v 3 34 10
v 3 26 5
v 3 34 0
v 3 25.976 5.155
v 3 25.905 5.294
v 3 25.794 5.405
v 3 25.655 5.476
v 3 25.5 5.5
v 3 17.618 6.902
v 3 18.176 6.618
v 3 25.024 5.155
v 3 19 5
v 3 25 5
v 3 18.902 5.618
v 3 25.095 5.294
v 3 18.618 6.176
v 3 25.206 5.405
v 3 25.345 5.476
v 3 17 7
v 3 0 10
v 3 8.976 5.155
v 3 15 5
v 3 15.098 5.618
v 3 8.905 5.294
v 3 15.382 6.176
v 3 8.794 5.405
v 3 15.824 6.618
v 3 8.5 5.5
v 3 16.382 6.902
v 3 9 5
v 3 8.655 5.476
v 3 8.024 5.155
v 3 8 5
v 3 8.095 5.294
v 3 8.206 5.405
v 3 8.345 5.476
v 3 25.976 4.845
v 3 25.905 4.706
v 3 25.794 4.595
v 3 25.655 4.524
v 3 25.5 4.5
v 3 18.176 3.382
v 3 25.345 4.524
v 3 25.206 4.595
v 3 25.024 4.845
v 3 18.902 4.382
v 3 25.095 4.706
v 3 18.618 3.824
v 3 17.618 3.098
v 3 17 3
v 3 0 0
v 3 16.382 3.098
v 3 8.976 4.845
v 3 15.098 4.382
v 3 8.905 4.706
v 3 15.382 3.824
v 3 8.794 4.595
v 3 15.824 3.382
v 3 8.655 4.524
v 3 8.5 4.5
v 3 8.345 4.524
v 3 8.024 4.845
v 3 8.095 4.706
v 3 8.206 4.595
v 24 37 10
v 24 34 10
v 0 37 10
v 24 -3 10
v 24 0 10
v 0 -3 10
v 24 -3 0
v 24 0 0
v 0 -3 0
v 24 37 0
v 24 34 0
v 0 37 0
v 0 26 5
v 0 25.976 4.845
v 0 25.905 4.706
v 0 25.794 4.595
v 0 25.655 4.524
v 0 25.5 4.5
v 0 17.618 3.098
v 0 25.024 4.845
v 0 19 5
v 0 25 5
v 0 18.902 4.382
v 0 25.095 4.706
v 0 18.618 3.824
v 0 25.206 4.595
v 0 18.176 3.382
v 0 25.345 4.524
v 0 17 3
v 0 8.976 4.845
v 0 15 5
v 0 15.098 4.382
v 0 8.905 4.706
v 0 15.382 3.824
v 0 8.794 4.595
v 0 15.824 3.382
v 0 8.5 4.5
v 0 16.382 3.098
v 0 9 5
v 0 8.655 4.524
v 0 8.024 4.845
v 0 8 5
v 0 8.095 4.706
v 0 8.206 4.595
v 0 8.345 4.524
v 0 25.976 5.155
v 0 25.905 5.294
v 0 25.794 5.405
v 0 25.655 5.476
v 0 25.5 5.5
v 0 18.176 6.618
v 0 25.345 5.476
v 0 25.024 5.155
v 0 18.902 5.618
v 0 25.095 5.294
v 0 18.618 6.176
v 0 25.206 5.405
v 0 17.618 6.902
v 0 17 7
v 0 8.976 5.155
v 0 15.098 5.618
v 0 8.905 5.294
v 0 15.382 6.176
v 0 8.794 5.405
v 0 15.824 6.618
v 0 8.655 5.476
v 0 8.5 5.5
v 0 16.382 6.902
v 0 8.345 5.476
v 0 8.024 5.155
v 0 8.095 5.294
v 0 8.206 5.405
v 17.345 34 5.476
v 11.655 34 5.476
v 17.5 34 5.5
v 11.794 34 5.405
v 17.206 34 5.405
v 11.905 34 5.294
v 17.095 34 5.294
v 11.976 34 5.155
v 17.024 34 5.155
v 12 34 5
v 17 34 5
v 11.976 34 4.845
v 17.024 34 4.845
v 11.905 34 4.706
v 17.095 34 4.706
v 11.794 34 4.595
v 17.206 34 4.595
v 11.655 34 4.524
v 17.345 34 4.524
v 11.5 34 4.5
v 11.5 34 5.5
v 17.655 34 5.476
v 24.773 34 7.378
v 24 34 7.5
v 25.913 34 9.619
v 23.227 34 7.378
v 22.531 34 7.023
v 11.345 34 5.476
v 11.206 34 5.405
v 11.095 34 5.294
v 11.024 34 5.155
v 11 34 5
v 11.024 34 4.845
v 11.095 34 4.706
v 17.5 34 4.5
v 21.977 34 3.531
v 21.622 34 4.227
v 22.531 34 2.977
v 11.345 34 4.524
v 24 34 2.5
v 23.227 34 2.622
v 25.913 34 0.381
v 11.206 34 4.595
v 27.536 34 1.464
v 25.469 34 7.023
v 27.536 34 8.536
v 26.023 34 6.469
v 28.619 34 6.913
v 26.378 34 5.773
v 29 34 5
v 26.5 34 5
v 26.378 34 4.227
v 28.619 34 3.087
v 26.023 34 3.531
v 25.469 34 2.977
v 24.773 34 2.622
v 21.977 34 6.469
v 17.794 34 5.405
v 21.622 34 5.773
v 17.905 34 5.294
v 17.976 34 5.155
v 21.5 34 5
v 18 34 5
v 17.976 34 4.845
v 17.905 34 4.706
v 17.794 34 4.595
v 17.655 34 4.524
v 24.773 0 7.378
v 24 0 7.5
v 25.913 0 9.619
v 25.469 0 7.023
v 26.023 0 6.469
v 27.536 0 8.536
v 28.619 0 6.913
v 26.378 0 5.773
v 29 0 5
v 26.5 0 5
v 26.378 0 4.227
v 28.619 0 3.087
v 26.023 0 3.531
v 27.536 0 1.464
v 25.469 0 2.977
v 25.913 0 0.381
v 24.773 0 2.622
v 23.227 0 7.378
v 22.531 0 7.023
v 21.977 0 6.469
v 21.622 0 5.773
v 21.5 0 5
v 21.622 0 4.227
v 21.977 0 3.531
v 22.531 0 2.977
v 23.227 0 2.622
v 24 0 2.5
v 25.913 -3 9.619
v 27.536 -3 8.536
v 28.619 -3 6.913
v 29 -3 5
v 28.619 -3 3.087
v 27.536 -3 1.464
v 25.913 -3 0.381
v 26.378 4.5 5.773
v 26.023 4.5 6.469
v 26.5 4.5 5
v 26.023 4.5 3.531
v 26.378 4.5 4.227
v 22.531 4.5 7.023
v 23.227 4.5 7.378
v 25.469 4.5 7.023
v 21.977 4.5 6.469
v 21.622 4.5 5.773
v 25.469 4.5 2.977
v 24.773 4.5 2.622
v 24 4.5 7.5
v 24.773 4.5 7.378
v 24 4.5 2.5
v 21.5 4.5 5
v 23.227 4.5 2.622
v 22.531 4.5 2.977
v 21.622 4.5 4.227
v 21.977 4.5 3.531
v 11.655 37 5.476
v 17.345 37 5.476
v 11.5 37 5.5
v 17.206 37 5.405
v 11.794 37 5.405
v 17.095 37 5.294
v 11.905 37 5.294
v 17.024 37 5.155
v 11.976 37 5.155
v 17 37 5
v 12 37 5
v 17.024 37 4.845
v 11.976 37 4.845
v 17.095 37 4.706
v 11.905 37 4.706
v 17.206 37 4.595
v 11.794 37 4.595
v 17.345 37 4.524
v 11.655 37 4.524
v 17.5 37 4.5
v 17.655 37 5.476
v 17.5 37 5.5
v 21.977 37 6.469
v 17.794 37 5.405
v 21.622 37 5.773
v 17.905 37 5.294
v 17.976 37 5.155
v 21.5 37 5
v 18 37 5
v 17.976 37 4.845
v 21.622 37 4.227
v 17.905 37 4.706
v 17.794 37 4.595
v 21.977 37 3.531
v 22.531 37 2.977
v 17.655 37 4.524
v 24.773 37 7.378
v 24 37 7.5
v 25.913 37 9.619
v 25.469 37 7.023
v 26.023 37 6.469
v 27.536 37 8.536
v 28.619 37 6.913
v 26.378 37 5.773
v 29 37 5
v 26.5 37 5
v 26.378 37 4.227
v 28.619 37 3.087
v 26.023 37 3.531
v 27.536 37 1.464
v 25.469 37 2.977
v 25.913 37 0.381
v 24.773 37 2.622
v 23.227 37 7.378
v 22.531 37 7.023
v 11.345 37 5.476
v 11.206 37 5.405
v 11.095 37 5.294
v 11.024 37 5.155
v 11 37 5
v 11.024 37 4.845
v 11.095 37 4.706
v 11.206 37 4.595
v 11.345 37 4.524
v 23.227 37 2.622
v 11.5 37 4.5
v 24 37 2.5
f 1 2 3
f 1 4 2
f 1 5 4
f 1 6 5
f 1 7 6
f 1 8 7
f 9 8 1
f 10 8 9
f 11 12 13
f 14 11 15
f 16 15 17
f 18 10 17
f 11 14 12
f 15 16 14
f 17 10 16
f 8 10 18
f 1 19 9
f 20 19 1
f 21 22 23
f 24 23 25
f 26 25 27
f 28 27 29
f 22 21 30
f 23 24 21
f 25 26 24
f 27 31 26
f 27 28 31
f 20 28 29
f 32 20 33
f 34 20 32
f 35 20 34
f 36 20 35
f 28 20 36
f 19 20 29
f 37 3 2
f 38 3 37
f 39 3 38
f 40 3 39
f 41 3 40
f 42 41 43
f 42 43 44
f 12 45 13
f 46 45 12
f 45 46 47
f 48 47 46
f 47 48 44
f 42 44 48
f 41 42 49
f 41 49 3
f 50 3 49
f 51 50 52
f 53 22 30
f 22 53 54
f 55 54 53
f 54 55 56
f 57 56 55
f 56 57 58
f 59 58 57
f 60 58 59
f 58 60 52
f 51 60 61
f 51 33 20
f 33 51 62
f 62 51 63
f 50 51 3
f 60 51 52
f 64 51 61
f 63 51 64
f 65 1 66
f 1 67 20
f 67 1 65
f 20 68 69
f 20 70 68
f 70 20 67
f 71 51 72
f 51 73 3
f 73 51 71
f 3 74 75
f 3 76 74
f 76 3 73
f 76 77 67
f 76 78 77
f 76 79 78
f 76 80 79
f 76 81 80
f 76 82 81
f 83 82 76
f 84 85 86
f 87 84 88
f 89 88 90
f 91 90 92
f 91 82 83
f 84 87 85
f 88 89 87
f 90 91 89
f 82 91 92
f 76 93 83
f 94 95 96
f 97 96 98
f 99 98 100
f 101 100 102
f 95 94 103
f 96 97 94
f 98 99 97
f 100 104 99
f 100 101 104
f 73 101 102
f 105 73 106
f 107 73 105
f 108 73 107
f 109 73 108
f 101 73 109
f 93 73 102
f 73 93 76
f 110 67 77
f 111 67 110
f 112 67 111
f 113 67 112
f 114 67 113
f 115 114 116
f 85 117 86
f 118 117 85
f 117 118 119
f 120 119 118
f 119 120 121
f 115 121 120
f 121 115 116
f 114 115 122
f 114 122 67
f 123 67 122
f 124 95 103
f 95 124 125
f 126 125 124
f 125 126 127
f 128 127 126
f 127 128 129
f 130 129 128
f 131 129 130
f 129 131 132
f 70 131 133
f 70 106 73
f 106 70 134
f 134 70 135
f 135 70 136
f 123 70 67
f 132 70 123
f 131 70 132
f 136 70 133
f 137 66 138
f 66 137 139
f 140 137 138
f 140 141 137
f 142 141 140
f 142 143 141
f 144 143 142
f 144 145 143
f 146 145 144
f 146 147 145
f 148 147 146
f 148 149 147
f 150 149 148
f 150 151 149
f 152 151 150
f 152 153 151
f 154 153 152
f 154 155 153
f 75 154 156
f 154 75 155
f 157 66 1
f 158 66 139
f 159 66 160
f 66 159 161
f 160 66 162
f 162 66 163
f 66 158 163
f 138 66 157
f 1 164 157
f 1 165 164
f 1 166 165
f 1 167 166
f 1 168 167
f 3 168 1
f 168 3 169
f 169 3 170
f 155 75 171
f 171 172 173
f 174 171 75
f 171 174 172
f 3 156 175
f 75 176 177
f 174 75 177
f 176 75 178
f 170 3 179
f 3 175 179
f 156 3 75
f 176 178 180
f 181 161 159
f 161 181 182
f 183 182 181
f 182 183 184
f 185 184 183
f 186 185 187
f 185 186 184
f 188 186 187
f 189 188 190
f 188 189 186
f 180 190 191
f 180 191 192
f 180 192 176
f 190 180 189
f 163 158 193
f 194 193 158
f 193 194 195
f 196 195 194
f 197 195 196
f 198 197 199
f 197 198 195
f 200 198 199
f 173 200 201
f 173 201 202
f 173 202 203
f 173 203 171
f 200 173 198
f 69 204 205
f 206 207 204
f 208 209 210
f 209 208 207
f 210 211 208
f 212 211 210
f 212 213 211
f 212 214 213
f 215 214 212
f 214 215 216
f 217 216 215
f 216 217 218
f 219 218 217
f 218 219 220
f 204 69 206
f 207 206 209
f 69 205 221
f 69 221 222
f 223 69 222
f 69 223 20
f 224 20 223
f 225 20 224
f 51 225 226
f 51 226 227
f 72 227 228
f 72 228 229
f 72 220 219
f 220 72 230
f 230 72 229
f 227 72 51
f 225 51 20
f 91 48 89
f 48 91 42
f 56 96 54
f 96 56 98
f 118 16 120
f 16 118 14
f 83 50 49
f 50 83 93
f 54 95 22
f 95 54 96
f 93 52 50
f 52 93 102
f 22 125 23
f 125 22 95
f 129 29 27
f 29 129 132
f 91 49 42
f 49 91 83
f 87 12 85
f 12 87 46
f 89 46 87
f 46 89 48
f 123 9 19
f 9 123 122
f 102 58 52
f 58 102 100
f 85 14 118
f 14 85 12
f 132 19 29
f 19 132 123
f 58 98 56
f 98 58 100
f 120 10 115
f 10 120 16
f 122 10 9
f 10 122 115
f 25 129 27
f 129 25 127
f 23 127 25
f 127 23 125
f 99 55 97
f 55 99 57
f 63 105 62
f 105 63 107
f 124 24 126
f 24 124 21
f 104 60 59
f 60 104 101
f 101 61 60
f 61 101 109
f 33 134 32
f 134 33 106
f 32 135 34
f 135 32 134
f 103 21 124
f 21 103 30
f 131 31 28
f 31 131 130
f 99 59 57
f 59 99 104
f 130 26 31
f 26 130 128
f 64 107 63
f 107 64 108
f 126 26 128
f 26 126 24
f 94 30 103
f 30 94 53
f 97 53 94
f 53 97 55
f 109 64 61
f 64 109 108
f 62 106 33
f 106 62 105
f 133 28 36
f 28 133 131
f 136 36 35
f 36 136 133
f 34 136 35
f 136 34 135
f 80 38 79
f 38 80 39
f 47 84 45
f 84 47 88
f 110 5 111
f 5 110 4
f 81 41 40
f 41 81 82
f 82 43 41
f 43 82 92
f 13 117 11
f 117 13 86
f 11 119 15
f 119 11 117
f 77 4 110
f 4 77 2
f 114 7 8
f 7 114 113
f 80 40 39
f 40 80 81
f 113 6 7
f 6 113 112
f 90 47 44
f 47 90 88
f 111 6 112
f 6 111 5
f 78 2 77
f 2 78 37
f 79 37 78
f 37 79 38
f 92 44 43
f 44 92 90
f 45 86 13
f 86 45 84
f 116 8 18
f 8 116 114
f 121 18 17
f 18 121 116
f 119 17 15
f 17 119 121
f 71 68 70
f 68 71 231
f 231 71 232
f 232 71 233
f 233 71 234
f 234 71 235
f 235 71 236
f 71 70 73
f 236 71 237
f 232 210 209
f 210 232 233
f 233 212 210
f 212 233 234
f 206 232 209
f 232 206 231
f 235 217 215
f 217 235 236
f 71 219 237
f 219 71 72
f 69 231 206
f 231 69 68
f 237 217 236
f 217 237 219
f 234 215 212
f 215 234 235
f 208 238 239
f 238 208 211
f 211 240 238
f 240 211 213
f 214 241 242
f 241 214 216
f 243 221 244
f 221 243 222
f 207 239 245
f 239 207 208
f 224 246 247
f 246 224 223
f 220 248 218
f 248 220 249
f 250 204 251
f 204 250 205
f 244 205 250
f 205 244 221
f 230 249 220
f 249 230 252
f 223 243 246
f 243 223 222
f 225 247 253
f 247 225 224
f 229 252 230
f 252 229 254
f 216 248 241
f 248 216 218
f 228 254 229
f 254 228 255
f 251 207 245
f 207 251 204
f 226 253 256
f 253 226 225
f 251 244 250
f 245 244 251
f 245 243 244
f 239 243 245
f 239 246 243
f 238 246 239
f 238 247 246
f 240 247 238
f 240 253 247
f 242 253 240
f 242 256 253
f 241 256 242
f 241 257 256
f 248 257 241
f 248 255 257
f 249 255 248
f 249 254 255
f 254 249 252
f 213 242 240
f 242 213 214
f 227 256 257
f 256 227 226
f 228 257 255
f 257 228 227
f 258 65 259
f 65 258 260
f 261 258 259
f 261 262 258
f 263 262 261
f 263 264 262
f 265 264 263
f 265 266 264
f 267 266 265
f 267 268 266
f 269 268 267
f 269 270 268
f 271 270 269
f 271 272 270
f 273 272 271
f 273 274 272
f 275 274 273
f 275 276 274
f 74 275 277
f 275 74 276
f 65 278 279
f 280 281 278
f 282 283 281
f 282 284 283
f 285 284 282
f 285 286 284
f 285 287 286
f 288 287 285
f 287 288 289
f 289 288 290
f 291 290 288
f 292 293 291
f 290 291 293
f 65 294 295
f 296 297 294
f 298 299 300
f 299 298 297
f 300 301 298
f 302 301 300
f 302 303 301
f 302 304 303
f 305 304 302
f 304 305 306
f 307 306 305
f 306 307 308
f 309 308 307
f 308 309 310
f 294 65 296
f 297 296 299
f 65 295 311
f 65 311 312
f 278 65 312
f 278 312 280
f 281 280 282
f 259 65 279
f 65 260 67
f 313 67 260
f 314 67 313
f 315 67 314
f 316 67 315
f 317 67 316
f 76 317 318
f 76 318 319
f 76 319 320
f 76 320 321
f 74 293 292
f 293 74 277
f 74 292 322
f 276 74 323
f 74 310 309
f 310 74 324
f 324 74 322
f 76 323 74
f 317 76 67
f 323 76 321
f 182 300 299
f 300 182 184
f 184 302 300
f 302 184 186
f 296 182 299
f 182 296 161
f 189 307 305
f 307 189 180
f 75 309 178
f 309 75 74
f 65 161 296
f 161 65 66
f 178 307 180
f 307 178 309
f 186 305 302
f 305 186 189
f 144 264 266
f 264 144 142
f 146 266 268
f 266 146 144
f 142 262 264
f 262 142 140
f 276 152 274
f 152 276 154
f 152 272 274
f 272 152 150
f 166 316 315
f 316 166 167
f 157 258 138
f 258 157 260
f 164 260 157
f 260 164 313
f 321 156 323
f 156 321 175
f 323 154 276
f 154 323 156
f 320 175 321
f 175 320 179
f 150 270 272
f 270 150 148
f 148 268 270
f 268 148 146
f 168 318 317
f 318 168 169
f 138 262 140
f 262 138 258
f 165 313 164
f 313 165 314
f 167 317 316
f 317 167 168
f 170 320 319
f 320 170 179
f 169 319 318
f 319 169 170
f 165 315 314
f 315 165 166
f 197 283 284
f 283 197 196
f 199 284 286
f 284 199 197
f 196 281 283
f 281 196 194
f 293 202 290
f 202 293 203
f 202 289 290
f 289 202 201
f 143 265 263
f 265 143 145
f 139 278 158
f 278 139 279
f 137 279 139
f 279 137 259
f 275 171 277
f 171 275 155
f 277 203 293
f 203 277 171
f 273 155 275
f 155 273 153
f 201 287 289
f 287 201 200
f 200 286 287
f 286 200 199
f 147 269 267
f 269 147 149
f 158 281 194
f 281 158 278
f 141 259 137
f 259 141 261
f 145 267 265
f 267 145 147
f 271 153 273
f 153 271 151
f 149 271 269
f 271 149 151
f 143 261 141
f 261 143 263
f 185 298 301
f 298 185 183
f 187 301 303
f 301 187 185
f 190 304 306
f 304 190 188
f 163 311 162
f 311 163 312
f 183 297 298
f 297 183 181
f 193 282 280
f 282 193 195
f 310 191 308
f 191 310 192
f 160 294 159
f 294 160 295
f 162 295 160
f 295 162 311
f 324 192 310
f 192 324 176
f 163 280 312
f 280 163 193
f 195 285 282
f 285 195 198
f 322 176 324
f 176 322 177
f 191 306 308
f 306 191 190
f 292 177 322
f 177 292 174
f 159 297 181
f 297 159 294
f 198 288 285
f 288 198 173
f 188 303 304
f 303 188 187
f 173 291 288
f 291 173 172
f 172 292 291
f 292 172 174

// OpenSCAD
//LegPart-v3

//variables
xBack = 3;
yBack = 34;
zBack = 10;

bigBackHoleD = 4;
smallHolesD = 1;
bigSideHoleD = 5;

sideCylinderH = 4.5;
sideCylinderCenterA = 11.5;
sideCylinderCenterB = 17.5;
holeH = 12;

xSide = 24;
ySide = 3;
zSide = 10;


//modules
module back(){
    difference(){
        cube([xBack, yBack, zBack]);
        translate([xBack,yBack/2,zBack/2])
            rotate([0,90,0])
                cylinder(h=holeH, d=bigBackHoleD, center=true, $fn=20);
        translate([xBack,yBack/4,zBack/2])
            rotate([0,90,0])
                cylinder(h=holeH, d=smallHolesD, center=true, $fn=20);
        translate([xBack,3*(yBack/4),zBack/2])
            rotate([0,90,0])
                cylinder(h=holeH, d=smallHolesD, center=true, $fn=20);
        }
}

module side(){
    union(){
        cube([xSide, ySide, zSide]);
        translate([xSide,ySide,zSide/2])
            rotate([90,0,0])
                cylinder(h=ySide, d=zSide, $f=20);
    }    
}

module rightSide(){
    difference(){
        side();
        translate([sideCylinderCenterA,0,zSide/2])
            rotate([90,0,0])
                cylinder(h=holeH, d=smallHolesD, center=true, $fn=20);
        translate([sideCylinderCenterB,0,zSide/2])
            rotate([90,0,0])
                cylinder(h=holeH, d=smallHolesD, center=true, $fn=20);
        translate([xSide,0,zSide/2])
            rotate([90,0,0])
                cylinder(h=holeH, d=bigSideHoleD, center=true, $fn=20);
    }
}

module leftSide(){
    union(){
        side();
        translate([xSide,ySide+sideCylinderH,zSide/2])
            rotate([90,0,0])
                cylinder(h=sideCylinderH, d=bigSideHoleD, $fn=20);
    }    
}


module legPartV3(){
    union(){
        back();
        translate([0,-ySide,0])
            leftSide();
        translate([0,yBack,0])
            rightSide();
    }
}

legPartV3();
